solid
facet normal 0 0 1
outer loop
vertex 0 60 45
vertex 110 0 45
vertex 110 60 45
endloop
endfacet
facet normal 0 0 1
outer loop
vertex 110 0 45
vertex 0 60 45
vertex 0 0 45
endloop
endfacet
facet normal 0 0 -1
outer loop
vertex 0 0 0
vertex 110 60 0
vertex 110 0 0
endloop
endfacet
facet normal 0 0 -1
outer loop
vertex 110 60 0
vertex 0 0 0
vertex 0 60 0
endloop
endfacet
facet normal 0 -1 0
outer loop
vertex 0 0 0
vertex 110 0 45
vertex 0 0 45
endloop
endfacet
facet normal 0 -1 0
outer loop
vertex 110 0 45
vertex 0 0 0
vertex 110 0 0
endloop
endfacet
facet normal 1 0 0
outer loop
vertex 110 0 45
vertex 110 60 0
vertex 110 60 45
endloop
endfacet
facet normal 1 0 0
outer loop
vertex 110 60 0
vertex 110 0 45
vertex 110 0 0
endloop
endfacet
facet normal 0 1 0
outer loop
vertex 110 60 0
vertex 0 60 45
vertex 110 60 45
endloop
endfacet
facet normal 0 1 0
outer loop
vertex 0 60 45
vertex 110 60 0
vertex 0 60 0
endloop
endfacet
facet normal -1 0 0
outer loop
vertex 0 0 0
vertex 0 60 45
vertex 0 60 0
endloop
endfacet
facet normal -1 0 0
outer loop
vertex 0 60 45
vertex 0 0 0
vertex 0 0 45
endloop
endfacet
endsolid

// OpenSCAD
CONTROL_BOARD_LENGTH=110;
CONTROL_BOARD_WIDTH=60;
CONTROL_BOARD_HEIGHT=45;
module control_board() {
    color("yellow"){
		cube([CONTROL_BOARD_LENGTH, CONTROL_BOARD_WIDTH, CONTROL_BOARD_HEIGHT]);
	}
}

control_board();
